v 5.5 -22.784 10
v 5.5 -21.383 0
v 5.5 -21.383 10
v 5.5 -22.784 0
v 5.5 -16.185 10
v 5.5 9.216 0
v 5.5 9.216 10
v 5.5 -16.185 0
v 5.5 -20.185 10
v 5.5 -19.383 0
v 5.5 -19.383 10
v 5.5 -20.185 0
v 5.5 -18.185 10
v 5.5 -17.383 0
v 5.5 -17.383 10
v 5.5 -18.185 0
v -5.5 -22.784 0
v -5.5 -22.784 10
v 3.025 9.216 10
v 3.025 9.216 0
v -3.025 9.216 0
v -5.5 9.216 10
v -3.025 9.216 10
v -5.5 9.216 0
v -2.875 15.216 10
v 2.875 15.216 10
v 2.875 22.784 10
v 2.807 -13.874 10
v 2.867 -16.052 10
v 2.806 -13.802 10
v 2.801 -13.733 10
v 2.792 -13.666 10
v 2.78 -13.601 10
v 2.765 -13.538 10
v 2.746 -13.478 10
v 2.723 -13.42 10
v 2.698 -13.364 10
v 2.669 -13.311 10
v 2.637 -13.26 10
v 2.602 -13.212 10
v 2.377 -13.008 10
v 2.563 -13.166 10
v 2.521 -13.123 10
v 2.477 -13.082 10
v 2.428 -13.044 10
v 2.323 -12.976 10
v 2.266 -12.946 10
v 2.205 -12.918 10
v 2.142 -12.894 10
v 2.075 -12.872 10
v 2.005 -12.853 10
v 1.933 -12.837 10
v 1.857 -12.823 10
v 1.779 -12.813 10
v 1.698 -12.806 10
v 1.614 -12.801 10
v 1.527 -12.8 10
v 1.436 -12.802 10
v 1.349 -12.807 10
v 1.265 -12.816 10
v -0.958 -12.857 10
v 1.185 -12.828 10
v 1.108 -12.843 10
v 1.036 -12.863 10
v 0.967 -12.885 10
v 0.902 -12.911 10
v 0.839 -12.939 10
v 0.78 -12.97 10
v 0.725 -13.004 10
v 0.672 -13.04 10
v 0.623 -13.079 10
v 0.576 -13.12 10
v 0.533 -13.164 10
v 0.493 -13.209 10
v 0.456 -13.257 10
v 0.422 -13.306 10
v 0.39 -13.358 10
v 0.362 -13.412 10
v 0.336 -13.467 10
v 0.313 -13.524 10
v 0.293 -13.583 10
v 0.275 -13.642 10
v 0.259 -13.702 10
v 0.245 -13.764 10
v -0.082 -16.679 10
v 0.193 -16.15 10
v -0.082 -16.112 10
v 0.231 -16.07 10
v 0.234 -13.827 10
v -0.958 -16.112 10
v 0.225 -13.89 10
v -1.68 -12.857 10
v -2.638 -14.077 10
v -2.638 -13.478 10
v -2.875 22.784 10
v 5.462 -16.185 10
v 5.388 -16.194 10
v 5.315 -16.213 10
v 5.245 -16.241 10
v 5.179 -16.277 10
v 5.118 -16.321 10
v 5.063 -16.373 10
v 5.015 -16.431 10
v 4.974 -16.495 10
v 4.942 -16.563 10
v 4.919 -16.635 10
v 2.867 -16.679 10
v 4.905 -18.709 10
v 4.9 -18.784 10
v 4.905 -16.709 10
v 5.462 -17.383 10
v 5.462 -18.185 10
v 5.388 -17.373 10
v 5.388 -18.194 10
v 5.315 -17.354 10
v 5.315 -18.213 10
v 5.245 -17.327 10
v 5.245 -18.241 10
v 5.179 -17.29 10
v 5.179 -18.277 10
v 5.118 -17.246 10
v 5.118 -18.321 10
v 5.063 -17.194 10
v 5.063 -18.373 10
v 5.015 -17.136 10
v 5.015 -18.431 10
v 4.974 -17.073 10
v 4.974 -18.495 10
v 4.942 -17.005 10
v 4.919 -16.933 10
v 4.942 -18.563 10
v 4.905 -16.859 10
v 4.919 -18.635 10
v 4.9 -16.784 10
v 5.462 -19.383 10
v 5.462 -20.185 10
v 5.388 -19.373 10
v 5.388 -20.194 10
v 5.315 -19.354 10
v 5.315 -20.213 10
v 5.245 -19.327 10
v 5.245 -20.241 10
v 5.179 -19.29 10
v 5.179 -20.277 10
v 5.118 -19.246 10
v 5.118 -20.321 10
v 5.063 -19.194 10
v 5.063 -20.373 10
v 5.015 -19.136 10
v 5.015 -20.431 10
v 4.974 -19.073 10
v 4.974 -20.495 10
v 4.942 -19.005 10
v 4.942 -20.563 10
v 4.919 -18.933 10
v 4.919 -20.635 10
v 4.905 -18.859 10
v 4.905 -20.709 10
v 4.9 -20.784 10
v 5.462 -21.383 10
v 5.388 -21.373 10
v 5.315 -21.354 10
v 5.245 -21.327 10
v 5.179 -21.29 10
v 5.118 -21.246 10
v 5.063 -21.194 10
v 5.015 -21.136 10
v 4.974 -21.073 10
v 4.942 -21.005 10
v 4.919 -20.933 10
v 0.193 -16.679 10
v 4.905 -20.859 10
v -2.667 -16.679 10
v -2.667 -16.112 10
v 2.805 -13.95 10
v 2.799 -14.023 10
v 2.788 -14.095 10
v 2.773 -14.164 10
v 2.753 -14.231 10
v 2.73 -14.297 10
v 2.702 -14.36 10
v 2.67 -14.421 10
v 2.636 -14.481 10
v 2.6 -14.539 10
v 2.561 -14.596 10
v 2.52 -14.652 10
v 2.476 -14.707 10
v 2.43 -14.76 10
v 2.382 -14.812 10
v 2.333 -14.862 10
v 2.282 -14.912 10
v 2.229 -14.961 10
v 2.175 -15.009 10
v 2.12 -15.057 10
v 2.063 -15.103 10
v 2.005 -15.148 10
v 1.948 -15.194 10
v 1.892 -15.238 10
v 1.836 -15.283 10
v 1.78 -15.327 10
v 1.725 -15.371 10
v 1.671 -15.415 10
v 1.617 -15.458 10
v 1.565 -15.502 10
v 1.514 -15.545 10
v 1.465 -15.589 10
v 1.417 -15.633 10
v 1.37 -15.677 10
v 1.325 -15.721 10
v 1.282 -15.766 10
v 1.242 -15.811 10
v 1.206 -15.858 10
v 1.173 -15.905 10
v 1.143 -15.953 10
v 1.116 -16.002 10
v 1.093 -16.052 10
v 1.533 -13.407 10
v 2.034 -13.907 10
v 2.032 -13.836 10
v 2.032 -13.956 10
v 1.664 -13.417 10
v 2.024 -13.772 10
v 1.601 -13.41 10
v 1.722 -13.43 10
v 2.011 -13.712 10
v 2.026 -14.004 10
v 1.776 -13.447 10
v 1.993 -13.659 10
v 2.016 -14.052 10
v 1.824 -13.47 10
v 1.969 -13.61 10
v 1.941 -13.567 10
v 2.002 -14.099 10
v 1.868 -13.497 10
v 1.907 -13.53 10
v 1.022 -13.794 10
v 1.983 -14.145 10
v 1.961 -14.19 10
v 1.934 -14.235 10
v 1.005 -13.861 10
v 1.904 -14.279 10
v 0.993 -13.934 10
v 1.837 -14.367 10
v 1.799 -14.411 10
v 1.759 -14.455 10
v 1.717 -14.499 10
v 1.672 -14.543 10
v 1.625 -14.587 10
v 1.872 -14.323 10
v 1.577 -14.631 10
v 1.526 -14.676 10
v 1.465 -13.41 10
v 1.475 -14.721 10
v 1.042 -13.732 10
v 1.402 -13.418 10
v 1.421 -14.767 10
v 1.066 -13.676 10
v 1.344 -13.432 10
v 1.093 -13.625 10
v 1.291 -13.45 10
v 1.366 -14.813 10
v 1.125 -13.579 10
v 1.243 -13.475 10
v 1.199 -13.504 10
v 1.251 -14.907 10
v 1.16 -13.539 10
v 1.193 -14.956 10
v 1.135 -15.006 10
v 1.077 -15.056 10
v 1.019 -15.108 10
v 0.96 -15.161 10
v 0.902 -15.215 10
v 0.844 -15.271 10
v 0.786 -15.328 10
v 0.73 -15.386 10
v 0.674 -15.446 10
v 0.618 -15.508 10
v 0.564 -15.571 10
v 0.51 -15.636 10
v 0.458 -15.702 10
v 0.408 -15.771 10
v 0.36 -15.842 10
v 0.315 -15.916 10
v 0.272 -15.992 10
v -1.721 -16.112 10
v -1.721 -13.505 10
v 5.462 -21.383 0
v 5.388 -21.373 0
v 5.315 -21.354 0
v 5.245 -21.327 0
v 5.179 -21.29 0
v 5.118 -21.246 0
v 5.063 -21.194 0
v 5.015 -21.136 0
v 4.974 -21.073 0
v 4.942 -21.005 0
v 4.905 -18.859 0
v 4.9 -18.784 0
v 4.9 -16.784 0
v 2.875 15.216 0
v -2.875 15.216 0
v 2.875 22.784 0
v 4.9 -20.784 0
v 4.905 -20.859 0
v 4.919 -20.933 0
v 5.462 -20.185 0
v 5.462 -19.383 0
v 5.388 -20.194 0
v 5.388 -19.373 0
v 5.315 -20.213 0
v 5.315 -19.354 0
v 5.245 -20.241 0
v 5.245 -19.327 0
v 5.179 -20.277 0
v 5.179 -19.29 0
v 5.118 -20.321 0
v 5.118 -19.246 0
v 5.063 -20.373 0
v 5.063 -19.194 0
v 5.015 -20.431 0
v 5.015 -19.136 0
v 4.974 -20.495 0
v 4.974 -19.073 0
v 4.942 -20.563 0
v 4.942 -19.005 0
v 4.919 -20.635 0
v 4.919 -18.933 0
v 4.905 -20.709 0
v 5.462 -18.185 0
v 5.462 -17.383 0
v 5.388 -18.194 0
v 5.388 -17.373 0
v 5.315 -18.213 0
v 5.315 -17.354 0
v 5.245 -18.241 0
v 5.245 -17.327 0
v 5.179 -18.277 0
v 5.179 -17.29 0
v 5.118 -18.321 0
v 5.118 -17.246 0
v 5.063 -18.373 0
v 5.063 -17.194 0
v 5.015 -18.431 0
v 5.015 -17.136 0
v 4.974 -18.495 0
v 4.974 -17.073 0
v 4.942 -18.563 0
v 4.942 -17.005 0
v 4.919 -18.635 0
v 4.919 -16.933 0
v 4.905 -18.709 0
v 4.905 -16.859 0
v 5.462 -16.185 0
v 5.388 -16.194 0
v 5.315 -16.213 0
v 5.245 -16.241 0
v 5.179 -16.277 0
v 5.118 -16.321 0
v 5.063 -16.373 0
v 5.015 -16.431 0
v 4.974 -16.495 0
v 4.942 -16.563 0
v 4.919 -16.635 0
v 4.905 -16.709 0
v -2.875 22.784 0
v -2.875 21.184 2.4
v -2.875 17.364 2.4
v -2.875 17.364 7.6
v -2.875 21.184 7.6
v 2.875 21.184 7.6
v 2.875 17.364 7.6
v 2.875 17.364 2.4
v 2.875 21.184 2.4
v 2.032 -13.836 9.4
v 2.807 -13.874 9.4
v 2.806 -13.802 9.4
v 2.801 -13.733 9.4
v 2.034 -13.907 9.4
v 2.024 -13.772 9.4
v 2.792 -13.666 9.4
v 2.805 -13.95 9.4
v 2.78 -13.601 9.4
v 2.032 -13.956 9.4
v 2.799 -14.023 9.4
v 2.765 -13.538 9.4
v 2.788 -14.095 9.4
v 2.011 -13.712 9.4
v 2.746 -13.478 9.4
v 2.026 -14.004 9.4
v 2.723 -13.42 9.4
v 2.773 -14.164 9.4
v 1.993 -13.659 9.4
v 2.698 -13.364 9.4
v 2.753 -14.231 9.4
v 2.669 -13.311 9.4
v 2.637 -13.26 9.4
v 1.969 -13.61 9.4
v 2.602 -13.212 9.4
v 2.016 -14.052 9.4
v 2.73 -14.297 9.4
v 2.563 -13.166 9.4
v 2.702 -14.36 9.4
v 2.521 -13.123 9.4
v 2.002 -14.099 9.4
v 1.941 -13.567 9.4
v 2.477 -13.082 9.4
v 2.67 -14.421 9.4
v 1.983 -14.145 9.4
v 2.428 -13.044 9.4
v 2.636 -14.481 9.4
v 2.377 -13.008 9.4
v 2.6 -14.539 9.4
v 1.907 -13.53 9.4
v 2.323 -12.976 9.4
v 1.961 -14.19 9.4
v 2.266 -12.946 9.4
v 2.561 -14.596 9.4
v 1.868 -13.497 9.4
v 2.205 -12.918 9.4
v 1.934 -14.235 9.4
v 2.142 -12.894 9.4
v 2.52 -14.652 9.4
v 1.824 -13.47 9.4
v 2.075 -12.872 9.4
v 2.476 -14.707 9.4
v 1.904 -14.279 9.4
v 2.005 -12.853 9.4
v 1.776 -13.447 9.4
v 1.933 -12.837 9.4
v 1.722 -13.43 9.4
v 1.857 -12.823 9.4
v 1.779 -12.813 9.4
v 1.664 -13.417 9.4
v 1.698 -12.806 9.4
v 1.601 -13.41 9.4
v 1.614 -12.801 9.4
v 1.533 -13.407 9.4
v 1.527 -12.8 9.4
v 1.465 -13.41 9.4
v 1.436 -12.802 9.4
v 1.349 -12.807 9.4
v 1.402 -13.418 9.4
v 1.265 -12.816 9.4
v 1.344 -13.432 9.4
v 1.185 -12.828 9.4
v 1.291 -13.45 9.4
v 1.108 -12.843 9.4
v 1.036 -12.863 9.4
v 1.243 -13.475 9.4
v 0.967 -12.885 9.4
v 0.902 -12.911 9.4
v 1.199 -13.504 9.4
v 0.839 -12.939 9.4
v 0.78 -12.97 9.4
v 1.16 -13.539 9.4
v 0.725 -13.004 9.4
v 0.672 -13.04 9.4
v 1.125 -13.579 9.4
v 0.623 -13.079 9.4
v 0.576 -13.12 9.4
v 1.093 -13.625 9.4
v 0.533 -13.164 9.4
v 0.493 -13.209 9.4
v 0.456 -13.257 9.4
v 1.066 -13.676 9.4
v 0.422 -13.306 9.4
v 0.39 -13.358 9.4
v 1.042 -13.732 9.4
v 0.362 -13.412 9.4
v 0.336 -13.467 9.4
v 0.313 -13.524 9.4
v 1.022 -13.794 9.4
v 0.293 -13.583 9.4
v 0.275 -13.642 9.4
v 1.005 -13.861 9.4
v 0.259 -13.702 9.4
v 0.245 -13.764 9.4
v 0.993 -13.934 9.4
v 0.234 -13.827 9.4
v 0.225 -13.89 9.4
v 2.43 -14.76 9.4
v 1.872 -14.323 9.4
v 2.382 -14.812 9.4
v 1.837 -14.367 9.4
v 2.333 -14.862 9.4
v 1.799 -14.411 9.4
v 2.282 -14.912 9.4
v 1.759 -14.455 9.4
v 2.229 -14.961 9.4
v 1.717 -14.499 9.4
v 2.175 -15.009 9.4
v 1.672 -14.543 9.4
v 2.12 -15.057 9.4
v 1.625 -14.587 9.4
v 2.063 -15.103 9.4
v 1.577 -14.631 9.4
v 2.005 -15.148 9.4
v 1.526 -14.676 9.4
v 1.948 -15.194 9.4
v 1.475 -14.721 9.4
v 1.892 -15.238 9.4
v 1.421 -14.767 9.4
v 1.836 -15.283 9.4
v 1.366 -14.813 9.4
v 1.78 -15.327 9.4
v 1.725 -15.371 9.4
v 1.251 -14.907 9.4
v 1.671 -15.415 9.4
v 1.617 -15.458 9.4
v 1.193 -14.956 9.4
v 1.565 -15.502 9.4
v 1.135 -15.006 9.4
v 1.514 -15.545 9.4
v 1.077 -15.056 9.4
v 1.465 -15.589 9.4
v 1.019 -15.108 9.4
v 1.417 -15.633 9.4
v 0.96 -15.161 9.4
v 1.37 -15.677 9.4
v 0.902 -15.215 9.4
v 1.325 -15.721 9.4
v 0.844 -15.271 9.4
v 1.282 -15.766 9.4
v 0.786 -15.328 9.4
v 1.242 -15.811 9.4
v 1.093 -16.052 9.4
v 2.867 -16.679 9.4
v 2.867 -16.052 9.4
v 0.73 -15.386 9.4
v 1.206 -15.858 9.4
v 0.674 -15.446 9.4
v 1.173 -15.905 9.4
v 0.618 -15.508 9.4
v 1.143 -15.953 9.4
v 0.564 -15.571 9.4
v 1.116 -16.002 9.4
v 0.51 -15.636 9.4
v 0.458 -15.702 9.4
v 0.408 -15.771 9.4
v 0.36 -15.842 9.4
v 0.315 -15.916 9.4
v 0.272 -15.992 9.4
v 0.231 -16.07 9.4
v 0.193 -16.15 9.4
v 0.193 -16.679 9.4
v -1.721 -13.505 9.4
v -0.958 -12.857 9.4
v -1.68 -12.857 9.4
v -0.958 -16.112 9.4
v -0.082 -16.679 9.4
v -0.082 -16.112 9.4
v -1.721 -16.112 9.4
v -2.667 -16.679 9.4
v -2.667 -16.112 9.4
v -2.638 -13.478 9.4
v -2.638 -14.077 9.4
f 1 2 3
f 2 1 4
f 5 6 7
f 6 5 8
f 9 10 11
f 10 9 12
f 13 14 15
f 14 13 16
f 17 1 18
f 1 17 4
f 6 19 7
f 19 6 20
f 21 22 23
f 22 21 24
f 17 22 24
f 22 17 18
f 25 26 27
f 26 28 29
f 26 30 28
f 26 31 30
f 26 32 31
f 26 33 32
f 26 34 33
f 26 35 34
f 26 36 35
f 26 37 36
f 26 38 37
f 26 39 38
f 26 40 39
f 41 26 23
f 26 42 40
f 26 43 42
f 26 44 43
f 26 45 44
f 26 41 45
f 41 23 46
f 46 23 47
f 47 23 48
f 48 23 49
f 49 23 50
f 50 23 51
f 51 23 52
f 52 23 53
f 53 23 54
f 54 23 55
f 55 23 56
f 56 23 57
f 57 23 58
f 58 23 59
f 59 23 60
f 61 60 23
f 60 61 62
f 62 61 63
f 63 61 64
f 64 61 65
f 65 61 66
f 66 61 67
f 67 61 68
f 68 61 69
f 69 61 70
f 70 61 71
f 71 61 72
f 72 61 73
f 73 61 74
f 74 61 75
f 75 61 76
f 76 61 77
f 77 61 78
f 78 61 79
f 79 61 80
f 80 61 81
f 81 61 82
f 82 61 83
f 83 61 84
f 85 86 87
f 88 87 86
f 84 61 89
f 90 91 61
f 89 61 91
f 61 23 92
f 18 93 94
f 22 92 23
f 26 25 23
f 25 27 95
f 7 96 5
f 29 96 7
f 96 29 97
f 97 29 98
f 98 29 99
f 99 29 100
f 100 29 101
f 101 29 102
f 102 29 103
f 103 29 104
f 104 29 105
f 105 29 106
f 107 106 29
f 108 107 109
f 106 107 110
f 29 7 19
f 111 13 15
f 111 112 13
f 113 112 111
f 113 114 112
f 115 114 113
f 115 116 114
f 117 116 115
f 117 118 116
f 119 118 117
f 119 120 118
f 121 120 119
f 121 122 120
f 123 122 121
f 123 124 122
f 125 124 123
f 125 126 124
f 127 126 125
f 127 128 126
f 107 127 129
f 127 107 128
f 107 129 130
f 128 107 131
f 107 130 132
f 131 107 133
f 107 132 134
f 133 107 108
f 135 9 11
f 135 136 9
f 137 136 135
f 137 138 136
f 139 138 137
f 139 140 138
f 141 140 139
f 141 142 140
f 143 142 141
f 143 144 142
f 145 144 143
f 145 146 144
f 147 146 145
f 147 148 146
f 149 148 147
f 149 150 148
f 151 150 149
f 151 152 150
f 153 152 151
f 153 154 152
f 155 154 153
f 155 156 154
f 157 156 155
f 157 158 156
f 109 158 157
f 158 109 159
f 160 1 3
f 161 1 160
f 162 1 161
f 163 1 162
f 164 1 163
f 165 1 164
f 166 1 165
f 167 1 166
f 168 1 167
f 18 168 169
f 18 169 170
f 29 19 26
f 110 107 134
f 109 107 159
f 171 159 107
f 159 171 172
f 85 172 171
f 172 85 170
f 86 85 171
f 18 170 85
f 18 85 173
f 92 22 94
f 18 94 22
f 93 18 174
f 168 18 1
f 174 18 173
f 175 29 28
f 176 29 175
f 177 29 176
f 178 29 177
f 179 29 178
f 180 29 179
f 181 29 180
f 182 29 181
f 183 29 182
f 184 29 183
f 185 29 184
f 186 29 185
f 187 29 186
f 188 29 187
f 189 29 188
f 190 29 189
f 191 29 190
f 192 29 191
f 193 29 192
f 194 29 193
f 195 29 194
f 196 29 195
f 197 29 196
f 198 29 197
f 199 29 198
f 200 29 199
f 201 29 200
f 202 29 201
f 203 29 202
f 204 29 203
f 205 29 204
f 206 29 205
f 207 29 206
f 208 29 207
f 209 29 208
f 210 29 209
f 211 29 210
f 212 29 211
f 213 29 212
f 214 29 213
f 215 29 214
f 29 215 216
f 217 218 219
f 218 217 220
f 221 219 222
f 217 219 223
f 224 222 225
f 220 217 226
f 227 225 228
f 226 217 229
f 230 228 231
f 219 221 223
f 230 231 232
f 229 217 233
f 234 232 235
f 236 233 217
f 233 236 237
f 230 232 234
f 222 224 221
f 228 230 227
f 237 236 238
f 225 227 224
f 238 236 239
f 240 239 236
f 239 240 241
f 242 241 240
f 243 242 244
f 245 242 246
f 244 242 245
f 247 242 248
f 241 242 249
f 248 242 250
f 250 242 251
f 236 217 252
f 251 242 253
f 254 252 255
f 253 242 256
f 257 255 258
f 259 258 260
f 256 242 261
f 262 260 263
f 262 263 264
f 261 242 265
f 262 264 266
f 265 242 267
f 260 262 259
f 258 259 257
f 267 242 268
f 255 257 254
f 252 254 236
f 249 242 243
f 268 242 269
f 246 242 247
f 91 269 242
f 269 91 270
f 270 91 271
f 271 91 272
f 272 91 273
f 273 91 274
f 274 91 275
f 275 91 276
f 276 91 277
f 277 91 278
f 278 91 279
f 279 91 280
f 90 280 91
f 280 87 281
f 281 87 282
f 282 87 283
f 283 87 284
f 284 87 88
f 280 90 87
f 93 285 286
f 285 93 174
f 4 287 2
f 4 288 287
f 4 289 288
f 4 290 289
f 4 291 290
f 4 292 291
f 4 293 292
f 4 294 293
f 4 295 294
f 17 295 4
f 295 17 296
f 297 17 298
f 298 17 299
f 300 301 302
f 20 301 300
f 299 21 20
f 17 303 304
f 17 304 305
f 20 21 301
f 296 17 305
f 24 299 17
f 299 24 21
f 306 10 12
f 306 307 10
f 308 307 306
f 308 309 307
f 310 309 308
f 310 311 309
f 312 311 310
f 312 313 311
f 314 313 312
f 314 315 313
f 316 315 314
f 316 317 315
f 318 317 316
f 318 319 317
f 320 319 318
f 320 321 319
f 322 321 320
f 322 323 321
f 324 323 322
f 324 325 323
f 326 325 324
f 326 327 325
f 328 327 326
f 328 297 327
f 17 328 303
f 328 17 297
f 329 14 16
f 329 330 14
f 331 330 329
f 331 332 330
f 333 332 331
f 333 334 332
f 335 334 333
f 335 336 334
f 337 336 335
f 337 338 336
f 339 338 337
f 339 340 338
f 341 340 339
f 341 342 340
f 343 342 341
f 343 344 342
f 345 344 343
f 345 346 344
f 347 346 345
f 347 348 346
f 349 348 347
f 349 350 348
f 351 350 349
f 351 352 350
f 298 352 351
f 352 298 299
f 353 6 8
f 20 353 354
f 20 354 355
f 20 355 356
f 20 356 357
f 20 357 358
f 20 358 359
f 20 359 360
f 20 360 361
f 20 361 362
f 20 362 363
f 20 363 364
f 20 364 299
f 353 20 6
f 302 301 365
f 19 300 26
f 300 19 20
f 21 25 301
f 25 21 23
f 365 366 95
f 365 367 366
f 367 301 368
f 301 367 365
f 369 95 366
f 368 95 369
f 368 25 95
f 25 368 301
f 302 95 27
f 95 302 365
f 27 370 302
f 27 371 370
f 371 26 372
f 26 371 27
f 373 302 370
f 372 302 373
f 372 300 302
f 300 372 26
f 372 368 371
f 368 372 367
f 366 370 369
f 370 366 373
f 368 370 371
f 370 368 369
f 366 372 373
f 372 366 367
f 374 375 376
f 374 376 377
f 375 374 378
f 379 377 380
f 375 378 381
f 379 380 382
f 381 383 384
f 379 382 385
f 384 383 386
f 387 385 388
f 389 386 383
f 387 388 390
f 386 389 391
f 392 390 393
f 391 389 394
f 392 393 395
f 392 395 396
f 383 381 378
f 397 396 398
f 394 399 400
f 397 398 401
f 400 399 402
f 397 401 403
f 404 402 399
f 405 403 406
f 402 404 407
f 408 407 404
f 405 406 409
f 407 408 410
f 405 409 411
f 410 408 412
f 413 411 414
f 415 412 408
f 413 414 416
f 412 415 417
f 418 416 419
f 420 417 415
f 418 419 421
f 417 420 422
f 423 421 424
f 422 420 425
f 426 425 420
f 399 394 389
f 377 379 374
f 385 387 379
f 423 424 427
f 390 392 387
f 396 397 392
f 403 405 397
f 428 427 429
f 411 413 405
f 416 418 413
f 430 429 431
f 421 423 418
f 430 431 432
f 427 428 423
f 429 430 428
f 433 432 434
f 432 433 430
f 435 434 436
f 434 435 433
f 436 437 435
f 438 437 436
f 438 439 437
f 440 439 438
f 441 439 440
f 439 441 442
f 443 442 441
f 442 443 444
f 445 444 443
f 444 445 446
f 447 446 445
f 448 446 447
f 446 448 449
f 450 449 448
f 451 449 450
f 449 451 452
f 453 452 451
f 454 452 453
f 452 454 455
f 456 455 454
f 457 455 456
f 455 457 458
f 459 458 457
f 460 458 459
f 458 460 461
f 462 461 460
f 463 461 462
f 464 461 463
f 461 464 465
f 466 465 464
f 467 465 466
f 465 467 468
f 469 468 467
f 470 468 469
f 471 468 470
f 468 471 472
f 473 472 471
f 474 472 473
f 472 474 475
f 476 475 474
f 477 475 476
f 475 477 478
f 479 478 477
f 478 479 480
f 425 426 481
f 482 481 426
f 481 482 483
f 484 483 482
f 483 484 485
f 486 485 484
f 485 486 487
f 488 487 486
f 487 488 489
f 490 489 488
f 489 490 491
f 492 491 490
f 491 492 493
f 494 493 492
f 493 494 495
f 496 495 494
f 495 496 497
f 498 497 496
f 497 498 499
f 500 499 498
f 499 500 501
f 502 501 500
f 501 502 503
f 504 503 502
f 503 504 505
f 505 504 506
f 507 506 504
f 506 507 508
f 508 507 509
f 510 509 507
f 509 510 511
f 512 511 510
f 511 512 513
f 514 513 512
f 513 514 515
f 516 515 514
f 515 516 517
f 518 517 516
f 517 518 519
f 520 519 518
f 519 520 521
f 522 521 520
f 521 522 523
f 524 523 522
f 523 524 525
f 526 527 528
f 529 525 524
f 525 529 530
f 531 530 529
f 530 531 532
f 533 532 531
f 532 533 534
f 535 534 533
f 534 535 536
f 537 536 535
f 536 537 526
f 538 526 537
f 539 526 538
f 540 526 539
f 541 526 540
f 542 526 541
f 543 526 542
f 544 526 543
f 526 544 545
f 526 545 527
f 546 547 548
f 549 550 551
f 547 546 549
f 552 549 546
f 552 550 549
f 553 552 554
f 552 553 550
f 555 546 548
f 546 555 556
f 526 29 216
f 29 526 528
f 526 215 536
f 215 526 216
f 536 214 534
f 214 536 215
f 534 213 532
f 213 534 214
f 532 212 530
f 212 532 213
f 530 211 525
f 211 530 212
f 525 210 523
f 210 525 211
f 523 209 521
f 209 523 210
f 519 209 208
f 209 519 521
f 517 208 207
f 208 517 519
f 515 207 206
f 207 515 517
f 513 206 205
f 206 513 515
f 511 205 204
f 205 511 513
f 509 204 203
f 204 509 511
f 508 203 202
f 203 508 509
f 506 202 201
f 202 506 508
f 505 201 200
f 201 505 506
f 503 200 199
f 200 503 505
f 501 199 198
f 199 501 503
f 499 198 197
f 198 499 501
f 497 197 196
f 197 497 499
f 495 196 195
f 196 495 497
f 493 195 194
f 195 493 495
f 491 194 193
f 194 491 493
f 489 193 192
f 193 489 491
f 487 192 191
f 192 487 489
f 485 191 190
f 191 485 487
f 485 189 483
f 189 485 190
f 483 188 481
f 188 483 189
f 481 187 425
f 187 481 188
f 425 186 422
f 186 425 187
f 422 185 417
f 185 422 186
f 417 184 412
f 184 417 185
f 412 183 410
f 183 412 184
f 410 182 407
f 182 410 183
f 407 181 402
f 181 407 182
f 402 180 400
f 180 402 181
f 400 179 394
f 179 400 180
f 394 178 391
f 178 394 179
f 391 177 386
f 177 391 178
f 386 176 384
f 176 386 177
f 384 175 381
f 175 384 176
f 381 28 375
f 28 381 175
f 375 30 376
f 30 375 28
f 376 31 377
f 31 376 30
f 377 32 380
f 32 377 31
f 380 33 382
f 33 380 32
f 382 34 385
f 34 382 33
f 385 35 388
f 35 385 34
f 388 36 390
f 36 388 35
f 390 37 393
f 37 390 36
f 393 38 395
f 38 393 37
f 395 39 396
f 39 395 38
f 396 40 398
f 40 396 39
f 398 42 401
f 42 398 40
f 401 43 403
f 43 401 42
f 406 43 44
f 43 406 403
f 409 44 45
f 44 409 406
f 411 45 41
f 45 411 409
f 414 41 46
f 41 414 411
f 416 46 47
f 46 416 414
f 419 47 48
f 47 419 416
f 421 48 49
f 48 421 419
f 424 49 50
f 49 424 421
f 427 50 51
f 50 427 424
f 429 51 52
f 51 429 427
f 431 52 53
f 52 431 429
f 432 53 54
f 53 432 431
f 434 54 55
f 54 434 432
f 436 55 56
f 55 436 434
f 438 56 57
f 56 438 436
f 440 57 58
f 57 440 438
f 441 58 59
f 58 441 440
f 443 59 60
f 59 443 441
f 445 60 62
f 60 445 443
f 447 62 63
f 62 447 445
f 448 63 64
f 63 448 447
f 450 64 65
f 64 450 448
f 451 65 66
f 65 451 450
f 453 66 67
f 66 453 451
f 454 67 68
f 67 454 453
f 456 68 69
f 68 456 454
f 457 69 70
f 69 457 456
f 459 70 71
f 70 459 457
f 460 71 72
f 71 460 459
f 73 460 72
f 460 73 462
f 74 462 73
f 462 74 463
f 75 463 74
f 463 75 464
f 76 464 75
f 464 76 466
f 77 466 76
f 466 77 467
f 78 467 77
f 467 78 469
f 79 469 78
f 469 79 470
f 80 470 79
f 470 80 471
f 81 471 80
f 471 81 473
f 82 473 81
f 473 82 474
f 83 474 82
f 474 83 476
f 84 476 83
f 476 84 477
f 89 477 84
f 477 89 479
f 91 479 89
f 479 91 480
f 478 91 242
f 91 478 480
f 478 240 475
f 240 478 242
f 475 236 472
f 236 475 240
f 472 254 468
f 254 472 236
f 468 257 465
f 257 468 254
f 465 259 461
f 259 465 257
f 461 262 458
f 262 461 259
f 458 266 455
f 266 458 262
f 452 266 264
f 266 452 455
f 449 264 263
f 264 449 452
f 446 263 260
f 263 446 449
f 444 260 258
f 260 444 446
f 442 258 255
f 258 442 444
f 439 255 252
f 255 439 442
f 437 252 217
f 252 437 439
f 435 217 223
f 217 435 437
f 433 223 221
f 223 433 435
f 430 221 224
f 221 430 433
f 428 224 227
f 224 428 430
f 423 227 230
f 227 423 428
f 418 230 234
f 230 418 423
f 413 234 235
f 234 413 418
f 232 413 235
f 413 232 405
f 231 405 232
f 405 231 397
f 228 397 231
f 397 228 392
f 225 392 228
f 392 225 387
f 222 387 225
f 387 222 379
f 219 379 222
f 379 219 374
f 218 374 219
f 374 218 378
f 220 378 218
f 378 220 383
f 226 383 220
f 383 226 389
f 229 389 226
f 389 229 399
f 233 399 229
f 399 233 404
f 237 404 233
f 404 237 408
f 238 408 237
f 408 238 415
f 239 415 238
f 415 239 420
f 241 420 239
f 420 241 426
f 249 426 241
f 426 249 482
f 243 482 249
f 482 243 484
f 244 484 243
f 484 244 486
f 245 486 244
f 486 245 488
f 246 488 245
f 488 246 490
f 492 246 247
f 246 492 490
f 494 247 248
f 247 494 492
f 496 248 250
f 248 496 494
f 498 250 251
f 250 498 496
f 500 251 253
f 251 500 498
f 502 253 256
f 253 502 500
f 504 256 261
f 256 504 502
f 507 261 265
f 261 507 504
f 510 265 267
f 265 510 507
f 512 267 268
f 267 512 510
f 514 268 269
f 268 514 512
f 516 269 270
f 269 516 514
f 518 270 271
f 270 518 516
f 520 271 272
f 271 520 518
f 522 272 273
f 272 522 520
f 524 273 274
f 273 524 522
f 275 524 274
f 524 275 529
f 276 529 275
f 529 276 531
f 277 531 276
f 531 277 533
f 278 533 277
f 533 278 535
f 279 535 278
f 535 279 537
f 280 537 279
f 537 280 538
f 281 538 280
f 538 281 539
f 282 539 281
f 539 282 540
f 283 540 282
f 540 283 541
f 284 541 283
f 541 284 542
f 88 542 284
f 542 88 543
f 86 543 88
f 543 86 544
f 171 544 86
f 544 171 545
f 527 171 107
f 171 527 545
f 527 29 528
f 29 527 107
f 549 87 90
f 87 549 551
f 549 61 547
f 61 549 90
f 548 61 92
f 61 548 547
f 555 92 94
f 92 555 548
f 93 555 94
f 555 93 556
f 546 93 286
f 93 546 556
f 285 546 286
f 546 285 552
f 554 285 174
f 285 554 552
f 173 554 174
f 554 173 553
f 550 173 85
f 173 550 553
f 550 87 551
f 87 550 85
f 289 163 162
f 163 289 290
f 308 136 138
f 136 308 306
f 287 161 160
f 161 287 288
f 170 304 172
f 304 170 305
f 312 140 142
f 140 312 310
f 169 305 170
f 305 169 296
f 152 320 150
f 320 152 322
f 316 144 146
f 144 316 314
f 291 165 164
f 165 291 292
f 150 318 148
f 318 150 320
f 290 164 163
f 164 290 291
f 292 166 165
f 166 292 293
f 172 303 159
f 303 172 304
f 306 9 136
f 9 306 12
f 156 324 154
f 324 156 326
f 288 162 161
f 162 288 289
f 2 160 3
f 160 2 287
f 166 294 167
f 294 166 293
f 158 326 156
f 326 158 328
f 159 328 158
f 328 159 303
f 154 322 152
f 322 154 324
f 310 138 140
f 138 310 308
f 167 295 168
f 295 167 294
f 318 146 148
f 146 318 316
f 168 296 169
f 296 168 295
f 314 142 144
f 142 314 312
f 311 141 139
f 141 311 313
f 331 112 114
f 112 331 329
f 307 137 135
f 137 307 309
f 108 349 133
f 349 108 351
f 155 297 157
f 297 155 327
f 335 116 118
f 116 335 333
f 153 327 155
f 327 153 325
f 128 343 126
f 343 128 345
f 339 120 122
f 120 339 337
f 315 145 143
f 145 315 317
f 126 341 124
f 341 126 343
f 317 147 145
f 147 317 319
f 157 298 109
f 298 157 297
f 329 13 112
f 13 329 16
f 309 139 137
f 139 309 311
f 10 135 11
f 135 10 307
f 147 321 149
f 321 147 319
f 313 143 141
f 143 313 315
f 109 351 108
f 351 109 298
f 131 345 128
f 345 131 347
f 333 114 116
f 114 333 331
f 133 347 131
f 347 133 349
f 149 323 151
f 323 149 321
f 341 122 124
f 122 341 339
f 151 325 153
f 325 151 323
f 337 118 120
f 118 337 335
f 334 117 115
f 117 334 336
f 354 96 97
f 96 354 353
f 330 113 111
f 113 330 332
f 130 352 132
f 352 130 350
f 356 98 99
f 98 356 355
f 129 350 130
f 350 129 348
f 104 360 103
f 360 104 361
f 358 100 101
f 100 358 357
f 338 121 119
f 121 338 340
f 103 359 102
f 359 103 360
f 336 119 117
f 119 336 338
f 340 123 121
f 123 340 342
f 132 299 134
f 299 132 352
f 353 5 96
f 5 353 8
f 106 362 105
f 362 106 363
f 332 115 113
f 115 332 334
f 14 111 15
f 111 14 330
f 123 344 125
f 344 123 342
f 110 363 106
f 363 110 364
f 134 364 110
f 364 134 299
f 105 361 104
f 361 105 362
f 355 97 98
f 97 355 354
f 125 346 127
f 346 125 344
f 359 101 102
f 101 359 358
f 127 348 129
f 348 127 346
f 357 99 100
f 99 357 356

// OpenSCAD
$fn = 50;

difference() {
	union() {
		translate(v = [0, 9.21625, 0]) {
			rotate(a = [90, 0, 0]) {
				difference() {
					union() {
						translate(v = [-5.5, 0, 0]) {
							cube(size = [11.0, 10.0, 32.0]);
						}
						translate(v = [0, 10.0, 0]) {
							rotate(a = [90, 0, 0]) {
								linear_extrude(height = 10.0) {
									polygon(points = [[-2.875, -13.5675], [2.875, -13.5675], [2.875, -6.0], [3.025, 0], [3.025, 0.1], [-3.025, 0.1], [-3.025, 0], [-2.875, -6.0]]);
								}
							}
						}
					}
					union() {
						translate(v = [-2.975, 2.4000000000000004, -11.9675]) {
							cube(size = [5.95, 5.199999999999999, 3.8200000000000003]);
						}
						translate(v = [0, 9.4, 24.0]) {
							rotate(a = [-90, 0, 0]) {
								linear_extrude(height = 0.7) {
									text(font = "Arial:style=Bold", halign = "center", size = 4.0, text = "12", valign = "center");
								}
							}
						}
						translate(v = [5.5, 10.1, 30.0]) {
							rotate(a = [90, 0, 0]) {
								cylinder(h = 10.2, r = 0.6);
							}
						}
						translate(v = [5.5, 10.1, 28.0]) {
							rotate(a = [90, 0, 0]) {
								cylinder(h = 10.2, r = 0.6);
							}
						}
						translate(v = [5.5, 10.1, 26.0]) {
							rotate(a = [90, 0, 0]) {
								cylinder(h = 10.2, r = 0.6);
							}
						}
					}
				}
			}
		}
	}
	union();
}
